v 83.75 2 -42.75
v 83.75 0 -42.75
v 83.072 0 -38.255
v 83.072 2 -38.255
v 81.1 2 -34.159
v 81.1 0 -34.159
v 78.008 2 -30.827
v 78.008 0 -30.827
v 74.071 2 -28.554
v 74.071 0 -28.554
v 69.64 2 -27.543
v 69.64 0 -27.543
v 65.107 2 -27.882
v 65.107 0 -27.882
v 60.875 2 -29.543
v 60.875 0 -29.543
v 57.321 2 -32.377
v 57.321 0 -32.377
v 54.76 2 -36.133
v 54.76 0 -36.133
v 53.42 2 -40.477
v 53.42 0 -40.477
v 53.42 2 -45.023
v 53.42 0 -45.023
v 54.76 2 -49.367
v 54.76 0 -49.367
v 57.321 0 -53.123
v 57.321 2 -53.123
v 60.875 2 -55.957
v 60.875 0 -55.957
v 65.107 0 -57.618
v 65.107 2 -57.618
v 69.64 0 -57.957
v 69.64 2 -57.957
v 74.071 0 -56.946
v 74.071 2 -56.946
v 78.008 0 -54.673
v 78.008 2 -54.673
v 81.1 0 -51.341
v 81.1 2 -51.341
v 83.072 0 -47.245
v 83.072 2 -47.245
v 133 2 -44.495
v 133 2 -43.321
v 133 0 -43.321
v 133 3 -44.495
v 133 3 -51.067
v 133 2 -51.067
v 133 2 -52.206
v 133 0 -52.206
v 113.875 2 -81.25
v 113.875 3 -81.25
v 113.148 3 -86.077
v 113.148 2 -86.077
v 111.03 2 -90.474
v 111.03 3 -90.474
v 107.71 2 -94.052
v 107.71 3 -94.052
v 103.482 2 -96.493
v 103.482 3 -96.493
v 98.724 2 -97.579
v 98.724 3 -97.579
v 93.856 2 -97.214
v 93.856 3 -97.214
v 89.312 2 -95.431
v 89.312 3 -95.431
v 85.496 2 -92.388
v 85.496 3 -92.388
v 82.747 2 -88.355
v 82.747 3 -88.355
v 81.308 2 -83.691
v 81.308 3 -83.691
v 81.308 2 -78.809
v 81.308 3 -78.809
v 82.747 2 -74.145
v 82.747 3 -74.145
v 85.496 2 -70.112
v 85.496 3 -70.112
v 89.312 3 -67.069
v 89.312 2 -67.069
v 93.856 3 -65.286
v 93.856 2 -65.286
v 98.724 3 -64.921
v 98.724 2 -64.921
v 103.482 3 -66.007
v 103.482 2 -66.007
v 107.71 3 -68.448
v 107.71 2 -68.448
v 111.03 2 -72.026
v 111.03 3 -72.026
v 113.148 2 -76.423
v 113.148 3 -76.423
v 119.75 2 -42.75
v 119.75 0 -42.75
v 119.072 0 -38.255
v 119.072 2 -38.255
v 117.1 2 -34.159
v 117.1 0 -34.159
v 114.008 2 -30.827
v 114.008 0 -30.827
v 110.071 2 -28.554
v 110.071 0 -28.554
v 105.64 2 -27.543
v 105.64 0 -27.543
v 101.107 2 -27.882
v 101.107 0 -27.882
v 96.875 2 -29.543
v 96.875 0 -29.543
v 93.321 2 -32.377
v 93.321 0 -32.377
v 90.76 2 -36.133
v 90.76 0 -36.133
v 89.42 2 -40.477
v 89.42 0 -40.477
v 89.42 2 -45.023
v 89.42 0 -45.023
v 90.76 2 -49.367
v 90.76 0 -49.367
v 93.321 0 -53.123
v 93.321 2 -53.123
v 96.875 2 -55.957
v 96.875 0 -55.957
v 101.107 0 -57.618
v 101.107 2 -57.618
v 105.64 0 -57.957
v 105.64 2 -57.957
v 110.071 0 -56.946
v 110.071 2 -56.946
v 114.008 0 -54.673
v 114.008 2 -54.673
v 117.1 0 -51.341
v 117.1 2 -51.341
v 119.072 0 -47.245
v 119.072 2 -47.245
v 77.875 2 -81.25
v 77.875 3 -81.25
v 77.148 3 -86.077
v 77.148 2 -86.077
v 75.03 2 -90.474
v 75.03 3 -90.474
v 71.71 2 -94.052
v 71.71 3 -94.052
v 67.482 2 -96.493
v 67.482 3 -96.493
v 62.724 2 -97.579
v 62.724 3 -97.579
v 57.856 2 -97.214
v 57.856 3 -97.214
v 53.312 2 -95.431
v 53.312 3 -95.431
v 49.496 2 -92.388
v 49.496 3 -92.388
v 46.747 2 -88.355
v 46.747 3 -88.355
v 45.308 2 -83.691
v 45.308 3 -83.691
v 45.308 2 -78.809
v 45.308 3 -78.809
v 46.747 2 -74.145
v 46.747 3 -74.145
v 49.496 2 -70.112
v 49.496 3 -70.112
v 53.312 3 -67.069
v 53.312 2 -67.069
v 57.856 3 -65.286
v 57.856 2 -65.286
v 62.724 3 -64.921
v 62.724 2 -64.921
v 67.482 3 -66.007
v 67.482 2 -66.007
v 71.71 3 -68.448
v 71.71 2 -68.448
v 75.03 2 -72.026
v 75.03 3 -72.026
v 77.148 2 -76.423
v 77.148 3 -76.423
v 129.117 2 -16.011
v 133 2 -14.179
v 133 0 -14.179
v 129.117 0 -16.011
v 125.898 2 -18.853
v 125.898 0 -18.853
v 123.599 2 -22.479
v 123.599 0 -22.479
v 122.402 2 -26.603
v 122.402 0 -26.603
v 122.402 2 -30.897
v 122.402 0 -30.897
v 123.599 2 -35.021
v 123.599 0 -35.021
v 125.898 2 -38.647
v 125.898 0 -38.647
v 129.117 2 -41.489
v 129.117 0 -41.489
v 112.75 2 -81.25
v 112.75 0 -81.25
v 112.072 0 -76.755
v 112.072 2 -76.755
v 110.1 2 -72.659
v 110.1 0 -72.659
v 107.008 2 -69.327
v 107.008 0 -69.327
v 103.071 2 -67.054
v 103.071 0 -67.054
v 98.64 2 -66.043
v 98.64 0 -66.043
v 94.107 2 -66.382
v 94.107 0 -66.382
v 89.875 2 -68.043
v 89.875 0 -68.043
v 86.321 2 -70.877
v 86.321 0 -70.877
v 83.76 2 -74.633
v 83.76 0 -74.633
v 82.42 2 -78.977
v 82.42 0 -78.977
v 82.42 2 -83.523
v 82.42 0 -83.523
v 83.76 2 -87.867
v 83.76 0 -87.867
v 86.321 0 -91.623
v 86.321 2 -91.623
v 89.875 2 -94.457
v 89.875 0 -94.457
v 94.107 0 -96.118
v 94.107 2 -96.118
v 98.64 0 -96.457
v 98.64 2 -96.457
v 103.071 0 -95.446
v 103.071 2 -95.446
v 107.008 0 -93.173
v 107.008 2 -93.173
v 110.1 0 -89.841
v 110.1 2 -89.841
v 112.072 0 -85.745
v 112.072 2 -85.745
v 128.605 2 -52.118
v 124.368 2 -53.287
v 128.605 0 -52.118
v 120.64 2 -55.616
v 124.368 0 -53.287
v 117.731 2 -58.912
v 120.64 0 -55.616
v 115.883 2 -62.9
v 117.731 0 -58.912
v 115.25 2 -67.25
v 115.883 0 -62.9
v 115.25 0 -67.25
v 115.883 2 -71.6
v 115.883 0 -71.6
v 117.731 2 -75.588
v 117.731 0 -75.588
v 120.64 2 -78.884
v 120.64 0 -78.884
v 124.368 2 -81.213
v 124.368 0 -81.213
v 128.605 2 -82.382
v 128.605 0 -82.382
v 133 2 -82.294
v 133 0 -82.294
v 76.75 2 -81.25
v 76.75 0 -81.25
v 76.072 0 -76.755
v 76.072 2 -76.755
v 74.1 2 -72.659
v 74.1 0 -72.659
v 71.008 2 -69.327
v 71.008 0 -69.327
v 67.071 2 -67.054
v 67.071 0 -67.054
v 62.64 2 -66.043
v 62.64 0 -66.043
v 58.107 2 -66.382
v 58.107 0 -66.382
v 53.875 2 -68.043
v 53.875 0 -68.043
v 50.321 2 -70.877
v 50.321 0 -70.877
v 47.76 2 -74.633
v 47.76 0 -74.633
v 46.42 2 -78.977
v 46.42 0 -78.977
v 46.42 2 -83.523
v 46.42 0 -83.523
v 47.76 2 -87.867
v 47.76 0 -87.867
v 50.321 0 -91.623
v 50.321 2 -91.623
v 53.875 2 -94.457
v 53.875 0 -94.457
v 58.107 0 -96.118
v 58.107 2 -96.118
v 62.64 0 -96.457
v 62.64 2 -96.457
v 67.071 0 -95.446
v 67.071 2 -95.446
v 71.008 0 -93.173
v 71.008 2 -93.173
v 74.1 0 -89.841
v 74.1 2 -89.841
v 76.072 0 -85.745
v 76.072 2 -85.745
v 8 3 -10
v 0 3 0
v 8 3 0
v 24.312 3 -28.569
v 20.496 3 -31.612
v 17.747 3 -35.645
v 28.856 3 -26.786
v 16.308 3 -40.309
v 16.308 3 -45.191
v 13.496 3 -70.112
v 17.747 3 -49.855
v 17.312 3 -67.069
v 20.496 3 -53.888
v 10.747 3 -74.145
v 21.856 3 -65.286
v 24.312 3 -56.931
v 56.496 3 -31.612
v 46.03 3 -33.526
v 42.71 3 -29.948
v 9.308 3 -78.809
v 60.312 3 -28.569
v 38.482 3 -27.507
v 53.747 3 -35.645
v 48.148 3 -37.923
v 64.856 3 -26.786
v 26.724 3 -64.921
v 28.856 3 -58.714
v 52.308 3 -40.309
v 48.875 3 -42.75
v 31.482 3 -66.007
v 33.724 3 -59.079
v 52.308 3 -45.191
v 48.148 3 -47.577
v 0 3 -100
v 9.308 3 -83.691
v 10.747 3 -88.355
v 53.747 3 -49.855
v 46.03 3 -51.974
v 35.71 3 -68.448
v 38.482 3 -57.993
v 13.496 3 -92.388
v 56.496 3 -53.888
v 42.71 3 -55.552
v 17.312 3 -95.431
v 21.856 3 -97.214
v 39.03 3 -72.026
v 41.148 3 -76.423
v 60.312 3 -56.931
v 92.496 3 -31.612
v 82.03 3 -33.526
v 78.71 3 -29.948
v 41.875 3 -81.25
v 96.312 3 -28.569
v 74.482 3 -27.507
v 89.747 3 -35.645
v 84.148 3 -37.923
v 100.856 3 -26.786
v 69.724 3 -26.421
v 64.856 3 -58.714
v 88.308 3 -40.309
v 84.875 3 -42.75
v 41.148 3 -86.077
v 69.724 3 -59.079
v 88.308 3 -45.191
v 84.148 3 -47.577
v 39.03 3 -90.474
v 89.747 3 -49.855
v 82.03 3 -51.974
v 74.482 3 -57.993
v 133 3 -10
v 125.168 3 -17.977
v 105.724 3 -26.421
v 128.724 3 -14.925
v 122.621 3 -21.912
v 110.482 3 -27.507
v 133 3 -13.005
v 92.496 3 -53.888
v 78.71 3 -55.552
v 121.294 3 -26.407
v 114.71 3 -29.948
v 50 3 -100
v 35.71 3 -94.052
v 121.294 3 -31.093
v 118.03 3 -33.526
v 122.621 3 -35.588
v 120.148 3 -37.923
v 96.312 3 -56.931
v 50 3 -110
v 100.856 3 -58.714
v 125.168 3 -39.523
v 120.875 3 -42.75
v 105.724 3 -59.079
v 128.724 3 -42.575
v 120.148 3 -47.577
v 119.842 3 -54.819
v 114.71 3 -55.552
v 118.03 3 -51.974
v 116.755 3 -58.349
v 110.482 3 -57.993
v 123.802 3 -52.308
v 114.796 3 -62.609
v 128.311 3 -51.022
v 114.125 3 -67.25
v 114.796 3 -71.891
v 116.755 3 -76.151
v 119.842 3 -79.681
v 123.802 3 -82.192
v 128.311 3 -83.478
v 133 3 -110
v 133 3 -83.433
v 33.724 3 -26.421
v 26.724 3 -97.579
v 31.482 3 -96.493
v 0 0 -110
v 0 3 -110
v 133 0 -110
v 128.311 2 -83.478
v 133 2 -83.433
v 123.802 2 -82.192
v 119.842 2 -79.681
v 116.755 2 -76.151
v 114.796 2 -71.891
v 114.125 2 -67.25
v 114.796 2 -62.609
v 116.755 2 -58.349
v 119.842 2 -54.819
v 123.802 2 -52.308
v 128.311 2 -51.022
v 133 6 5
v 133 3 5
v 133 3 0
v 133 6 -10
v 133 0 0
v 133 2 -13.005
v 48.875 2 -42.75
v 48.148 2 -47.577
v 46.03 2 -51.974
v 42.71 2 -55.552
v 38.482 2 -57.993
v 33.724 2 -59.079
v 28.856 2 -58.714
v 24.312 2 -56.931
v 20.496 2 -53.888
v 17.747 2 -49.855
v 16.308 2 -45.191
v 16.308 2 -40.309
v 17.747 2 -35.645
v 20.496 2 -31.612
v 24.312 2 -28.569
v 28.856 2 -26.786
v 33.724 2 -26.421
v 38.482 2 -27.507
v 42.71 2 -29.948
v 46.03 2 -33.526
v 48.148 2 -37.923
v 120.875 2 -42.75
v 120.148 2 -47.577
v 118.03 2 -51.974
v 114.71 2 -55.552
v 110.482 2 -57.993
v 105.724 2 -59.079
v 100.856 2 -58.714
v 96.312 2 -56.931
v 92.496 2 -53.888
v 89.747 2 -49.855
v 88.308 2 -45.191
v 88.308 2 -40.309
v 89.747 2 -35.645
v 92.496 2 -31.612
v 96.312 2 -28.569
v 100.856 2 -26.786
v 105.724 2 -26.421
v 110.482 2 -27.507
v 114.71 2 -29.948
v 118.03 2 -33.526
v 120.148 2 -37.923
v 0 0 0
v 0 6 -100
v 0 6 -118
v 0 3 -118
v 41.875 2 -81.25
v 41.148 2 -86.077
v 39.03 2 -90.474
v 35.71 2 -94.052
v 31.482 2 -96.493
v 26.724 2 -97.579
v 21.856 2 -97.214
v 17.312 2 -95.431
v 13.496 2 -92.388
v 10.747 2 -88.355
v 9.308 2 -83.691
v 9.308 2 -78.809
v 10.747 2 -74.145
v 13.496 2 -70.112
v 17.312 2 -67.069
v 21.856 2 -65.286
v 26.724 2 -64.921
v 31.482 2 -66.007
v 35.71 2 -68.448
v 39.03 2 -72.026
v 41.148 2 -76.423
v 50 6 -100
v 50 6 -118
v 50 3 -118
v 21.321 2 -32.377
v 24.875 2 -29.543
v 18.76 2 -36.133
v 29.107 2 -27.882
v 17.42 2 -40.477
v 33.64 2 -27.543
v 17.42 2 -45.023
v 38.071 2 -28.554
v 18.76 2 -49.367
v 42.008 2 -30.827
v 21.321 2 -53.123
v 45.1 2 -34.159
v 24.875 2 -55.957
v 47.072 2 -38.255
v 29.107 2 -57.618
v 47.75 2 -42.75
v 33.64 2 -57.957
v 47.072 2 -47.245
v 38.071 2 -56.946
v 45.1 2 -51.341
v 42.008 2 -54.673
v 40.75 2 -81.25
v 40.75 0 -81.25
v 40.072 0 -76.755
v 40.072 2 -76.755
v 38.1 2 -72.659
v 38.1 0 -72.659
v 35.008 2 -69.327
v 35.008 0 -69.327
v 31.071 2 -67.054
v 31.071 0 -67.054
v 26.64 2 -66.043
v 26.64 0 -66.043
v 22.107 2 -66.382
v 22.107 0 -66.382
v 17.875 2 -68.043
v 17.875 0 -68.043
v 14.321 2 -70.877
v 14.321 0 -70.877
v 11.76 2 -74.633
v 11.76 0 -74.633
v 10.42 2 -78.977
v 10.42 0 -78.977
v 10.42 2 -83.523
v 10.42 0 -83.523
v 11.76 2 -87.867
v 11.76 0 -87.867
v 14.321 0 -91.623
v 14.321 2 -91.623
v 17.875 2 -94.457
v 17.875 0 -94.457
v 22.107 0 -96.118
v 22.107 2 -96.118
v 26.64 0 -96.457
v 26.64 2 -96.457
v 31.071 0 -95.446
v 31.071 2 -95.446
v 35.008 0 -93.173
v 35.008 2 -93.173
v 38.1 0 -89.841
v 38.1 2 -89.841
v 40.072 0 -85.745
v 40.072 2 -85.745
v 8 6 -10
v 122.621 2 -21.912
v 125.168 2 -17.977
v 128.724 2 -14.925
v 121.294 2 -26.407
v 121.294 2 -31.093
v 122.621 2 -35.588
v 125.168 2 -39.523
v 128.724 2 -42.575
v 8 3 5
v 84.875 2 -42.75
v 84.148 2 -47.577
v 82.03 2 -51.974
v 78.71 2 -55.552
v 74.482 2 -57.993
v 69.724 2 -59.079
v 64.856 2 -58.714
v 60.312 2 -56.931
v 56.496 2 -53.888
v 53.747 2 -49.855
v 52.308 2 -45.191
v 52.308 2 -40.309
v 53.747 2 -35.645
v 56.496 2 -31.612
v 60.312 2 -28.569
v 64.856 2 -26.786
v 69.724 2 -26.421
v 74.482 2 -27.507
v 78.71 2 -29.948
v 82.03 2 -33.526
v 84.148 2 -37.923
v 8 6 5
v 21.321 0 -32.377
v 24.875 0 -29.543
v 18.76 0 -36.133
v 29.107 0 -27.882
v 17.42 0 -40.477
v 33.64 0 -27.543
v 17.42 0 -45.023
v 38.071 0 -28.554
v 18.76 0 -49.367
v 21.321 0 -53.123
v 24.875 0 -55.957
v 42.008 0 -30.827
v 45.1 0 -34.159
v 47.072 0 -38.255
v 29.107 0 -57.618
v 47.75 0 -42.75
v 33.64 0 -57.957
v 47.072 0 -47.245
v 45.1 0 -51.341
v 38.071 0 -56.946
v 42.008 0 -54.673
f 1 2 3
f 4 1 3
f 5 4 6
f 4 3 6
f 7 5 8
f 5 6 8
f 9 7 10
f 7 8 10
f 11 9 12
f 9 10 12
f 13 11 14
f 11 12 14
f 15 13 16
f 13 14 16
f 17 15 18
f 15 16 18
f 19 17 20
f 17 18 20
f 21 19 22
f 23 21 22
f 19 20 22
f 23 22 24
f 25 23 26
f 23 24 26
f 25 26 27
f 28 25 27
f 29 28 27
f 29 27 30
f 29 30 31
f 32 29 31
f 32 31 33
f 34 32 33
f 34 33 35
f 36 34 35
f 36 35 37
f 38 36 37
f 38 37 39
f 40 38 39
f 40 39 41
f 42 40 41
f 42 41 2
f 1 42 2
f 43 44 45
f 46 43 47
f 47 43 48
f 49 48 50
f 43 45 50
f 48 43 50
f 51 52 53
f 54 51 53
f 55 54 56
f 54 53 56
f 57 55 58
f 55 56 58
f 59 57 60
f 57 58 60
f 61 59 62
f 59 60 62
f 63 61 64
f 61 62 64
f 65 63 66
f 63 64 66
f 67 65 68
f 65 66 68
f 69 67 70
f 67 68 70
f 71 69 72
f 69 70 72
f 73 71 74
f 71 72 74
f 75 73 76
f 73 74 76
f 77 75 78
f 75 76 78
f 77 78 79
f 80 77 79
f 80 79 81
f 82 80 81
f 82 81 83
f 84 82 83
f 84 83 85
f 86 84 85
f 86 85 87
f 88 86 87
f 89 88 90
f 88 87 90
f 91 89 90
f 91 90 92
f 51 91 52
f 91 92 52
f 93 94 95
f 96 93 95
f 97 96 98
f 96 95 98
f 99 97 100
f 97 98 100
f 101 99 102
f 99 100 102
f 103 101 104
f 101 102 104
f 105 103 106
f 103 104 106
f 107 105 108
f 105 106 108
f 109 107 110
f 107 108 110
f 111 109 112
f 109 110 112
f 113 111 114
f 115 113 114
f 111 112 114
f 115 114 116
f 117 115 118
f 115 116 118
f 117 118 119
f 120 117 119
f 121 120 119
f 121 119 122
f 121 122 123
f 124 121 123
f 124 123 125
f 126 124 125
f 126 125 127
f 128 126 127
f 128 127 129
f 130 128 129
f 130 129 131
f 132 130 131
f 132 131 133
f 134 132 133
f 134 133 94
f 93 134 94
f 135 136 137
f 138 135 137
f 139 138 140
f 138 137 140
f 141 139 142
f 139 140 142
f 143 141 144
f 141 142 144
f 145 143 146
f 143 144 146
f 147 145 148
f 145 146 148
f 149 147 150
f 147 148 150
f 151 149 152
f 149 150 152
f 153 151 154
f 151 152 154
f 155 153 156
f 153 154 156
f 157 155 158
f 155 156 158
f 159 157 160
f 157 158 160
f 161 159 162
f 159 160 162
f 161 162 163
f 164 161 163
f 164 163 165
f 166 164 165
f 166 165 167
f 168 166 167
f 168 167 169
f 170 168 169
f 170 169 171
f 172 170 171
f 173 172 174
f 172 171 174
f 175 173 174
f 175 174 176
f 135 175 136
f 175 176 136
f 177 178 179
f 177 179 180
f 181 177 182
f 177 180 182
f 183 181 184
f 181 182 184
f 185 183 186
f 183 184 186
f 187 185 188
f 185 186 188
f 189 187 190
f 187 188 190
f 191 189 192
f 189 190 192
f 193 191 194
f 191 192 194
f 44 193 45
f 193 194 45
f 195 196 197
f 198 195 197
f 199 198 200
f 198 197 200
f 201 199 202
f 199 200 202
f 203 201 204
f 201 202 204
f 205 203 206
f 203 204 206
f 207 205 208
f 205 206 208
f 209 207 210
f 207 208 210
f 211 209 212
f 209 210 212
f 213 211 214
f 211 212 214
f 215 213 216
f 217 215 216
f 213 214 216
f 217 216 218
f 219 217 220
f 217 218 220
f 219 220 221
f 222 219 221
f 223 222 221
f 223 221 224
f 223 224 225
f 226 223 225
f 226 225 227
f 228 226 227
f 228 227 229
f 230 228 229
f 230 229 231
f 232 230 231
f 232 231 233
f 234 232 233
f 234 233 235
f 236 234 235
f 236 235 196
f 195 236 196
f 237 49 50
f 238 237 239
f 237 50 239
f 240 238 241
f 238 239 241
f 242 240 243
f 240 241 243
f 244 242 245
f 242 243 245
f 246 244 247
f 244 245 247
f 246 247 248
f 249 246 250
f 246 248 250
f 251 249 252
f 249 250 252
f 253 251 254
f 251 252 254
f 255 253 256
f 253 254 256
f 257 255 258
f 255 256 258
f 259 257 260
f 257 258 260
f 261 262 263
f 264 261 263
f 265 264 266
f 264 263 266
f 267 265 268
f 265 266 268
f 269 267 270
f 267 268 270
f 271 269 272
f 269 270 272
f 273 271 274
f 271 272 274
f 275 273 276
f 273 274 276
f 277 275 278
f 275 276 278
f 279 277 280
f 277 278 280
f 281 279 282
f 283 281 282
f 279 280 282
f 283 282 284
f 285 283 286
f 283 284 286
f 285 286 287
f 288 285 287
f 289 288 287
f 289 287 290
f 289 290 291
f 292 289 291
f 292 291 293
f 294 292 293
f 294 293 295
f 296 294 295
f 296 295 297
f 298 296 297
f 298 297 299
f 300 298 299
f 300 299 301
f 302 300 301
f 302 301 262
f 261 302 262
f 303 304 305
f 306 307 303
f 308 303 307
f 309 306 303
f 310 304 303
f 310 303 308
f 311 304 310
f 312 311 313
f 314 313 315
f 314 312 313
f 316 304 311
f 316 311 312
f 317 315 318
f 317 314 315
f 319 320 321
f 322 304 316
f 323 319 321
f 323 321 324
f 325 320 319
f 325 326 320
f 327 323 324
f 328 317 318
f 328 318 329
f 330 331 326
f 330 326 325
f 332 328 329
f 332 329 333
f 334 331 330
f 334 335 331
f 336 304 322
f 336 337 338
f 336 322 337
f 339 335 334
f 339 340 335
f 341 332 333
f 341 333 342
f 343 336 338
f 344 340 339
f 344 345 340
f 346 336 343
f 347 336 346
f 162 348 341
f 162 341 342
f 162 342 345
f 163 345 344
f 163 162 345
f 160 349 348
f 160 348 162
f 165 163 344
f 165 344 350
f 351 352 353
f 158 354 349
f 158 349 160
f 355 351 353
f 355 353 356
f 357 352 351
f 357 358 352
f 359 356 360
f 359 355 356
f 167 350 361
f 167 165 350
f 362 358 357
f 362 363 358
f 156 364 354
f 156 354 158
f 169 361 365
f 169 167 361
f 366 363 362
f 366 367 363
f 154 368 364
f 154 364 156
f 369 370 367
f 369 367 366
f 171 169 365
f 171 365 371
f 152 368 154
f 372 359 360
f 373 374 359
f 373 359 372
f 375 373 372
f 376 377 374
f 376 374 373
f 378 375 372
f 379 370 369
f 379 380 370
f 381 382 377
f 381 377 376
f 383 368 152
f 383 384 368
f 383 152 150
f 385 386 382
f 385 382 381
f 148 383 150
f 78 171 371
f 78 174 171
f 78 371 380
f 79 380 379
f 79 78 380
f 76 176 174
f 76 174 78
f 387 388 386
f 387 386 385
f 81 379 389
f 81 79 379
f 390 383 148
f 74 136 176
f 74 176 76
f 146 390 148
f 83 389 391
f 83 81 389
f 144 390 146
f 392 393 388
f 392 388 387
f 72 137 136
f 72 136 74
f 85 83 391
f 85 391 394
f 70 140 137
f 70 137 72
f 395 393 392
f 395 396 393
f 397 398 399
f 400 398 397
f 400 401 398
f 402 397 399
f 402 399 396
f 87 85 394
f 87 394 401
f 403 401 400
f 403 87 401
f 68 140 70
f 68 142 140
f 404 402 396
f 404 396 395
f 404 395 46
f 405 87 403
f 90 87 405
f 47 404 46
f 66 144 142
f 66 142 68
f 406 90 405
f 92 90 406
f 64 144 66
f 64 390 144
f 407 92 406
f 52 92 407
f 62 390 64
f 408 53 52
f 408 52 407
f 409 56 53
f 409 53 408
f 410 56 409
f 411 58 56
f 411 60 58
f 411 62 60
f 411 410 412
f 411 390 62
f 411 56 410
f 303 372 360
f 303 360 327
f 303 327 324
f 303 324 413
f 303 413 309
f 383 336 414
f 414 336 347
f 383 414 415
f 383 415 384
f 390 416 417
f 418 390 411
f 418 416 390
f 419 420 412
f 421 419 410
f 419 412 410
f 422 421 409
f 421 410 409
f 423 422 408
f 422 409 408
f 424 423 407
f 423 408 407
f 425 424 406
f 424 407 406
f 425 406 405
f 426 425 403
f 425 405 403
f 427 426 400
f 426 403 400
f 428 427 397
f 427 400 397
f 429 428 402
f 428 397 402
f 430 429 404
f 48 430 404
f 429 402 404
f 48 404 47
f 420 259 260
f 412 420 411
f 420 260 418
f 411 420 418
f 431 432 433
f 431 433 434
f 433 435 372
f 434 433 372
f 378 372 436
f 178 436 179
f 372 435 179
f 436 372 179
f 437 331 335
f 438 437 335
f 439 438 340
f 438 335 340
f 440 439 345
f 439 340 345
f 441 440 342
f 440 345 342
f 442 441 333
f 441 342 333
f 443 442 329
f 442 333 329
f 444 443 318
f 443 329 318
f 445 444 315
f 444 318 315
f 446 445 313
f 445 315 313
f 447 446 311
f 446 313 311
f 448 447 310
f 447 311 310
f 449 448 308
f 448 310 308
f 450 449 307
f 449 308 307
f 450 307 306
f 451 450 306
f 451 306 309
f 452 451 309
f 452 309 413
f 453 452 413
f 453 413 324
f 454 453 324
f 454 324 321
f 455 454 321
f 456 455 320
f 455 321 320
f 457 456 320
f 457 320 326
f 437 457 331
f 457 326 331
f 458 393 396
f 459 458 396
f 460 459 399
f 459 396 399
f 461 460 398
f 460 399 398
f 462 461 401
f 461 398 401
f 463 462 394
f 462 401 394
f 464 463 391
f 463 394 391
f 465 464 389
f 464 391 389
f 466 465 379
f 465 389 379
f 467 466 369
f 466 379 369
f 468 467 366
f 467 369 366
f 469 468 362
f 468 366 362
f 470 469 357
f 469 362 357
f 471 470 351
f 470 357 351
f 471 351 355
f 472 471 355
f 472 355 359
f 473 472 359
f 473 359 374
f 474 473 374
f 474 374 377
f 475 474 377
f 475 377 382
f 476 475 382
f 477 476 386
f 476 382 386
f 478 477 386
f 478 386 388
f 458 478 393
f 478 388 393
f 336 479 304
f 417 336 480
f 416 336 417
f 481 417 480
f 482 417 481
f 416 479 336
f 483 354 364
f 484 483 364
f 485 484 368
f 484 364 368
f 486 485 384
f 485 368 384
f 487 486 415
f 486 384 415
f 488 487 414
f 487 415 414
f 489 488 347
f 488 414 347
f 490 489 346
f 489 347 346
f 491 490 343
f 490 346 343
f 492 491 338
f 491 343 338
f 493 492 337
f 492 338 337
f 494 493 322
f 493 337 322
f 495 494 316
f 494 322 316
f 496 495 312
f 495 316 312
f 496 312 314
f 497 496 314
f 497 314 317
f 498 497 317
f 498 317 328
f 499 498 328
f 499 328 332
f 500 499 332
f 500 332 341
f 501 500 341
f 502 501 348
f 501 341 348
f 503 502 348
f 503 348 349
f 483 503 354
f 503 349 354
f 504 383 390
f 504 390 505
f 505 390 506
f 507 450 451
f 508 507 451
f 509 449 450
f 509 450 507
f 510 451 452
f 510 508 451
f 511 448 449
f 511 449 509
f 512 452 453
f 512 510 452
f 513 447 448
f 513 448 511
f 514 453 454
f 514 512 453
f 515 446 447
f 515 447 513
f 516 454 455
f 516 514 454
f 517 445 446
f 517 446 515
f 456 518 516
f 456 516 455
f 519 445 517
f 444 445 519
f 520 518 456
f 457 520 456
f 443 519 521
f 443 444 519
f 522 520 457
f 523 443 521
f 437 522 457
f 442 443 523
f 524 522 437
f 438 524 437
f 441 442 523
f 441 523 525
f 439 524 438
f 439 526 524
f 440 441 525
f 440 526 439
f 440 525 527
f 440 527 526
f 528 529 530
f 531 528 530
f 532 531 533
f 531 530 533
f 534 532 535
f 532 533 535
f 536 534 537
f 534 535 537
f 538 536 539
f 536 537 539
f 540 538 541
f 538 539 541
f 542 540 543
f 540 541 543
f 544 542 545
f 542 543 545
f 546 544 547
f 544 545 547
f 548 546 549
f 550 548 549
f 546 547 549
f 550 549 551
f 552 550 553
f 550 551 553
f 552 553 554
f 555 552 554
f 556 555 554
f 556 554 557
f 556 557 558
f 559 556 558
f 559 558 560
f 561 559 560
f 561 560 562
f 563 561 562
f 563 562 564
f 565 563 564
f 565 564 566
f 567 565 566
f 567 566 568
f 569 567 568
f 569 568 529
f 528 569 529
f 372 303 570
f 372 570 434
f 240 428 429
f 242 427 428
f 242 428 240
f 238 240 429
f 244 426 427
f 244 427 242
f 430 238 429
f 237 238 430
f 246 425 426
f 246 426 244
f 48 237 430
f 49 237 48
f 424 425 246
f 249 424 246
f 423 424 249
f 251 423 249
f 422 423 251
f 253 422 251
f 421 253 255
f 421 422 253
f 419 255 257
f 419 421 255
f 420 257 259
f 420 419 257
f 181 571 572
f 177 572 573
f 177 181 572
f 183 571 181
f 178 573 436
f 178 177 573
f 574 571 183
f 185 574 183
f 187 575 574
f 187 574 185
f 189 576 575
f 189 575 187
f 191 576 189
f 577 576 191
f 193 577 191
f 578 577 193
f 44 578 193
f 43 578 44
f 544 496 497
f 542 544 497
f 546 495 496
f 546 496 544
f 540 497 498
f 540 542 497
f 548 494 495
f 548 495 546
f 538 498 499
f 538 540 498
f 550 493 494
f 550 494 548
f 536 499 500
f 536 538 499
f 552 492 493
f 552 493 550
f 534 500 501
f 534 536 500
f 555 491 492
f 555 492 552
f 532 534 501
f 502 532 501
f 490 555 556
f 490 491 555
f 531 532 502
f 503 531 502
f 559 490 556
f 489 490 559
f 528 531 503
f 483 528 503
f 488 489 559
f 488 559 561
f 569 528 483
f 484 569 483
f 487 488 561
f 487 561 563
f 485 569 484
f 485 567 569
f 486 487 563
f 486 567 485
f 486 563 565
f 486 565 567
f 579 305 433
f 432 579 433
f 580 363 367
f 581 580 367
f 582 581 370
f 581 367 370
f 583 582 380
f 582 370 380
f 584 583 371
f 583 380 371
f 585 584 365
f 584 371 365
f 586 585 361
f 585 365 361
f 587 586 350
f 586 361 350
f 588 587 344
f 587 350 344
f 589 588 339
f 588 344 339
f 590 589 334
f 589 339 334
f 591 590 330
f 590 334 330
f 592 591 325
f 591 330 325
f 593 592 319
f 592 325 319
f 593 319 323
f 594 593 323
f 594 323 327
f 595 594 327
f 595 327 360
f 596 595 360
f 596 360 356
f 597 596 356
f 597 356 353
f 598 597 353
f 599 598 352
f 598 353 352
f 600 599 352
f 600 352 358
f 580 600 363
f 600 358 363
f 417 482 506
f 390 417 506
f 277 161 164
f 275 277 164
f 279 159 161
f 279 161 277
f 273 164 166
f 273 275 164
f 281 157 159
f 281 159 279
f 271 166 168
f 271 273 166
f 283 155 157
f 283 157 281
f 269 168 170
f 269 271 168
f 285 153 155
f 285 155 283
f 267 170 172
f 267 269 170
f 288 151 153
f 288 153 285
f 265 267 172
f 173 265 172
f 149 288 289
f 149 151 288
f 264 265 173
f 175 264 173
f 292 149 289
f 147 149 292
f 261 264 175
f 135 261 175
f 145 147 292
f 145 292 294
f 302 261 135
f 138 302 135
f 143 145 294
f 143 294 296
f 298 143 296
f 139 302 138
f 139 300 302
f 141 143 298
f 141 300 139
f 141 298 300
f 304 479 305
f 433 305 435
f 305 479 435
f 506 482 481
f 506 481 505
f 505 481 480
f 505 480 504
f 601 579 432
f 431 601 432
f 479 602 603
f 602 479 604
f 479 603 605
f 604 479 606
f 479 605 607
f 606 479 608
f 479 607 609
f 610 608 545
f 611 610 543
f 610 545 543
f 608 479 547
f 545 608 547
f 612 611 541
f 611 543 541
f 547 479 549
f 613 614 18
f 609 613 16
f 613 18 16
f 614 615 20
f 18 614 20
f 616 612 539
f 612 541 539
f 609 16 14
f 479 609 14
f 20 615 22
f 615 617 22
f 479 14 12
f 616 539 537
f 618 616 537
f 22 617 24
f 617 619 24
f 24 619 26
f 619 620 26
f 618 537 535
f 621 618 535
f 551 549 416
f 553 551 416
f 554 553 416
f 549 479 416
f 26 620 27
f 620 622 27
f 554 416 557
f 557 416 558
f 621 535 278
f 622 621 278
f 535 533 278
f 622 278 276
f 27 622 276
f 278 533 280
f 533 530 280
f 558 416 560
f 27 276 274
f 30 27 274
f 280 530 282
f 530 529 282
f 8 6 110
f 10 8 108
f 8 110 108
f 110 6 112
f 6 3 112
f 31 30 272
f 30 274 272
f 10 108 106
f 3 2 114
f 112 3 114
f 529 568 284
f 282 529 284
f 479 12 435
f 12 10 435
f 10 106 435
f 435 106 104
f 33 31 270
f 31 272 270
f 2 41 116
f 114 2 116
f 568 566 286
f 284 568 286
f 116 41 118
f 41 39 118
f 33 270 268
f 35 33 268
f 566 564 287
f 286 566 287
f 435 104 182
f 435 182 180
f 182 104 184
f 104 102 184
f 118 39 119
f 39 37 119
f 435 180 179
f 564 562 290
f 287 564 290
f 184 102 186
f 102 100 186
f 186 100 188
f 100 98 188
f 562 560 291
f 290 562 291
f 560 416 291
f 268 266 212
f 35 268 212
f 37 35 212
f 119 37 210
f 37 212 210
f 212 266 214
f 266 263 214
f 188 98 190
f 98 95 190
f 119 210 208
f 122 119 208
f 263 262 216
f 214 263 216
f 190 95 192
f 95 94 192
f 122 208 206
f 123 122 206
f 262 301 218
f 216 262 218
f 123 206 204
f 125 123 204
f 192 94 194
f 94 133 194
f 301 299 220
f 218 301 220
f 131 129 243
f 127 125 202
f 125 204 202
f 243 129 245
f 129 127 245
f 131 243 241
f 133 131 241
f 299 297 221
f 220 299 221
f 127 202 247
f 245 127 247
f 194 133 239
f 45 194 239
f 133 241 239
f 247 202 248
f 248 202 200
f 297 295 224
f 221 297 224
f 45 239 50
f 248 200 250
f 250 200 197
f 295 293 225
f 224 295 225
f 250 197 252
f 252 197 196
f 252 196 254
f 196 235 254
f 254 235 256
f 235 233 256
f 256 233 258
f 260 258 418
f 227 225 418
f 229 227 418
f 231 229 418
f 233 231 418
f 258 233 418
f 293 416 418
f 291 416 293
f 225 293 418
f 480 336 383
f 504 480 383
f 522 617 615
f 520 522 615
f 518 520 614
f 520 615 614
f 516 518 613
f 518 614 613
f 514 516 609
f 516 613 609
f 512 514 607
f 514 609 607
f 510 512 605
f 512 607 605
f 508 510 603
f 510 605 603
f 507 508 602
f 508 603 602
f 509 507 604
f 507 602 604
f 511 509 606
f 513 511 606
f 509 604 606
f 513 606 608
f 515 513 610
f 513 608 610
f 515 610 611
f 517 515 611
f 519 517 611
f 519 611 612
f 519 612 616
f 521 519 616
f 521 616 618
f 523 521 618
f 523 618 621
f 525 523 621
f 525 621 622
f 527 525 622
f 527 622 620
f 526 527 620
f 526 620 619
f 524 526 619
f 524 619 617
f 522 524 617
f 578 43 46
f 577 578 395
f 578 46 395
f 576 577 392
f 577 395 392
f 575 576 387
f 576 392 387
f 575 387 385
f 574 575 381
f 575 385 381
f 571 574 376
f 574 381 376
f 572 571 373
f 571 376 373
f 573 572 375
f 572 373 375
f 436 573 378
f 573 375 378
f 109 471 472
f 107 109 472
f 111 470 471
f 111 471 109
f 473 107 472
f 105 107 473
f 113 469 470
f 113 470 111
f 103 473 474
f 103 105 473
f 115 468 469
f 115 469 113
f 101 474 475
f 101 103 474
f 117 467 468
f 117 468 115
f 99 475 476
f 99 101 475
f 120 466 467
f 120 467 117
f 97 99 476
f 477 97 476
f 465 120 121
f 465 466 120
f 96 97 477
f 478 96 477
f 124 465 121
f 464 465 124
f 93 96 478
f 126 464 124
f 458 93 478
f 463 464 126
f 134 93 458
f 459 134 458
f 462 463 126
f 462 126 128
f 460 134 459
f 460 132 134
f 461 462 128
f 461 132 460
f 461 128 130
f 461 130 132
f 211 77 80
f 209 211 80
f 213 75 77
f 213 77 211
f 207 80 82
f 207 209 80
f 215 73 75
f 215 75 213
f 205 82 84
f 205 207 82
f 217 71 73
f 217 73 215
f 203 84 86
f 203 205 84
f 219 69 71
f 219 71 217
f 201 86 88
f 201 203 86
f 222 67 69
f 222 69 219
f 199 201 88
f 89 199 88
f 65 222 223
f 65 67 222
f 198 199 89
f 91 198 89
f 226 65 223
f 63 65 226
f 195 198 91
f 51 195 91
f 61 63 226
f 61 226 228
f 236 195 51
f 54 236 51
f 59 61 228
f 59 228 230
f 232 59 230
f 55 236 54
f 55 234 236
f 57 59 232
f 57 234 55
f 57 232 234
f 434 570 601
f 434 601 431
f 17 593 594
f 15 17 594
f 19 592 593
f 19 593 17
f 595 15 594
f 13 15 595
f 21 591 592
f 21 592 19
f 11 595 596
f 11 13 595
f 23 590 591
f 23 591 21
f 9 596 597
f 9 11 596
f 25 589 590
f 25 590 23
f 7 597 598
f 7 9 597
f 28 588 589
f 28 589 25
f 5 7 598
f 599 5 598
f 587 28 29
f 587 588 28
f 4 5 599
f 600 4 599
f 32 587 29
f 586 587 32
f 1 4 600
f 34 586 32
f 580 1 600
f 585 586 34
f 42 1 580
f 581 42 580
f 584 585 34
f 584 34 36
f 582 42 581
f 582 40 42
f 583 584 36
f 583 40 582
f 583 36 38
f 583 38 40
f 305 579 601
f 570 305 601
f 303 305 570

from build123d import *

# Parameters (mm, degrees)
SKETCH1_W           = 133
SKETCH1_H           = 110
BOSS_EXTRUDE1_DEPTH = 3
SKETCH2_W           = 50
SKETCH2_H           = 18
BOSS_EXTRUDE2_DEPTH = 3
SKETCH3_W           = 125
SKETCH3_H           = 15
BOSS_EXTRUDE3_DEPTH = 3
SKETCH4_R           = 15.25
CUT_EXTRUDE1_DEPTH  = 3
SKETCH5_R           = 16.375
CUT_EXTRUDE2_DEPTH  = 1


with BuildPart() as part:
    # Sketch1 → Boss-Extrude1 (new body)
    with BuildSketch(Plane(origin=(0, 0, 0), x_dir=(1, 0, 0), z_dir=(0, 1, 0))):
        with Locations((66.5, 55)):
            Rectangle(SKETCH1_W, SKETCH1_H)
    extrude(amount=BOSS_EXTRUDE1_DEPTH)

    # Sketch2 → Boss-Extrude2 (add)
    with BuildSketch(Plane(origin=(0, 3, 0), x_dir=(1, 0, 0), z_dir=(0, 1, 0))):
        with Locations((25, 109)):
            Rectangle(SKETCH2_W, SKETCH2_H)
    extrude(amount=BOSS_EXTRUDE2_DEPTH)

    # Sketch3 → Boss-Extrude3 (add)
    with BuildSketch(Plane(origin=(0, 3, 0), x_dir=(1, 0, 0), z_dir=(0, 1, 0))):
        with Locations((70.5, 2.5)):
            Rectangle(SKETCH3_W, SKETCH3_H)
    extrude(amount=BOSS_EXTRUDE3_DEPTH)

    # Sketch4 → Cut-Extrude1 (cut)
    with BuildSketch(Plane.XZ):
        with Locations((25.5, -81.25)):
            Circle(SKETCH4_R)
        with Locations((32.5, -42.75)):
            Circle(SKETCH4_R)
        with Locations((61.5, -81.25)):
            Circle(SKETCH4_R)
        with Locations((97.5, -81.25)):
            Circle(SKETCH4_R)
        with Locations((130.5, -67.25)):
            Circle(SKETCH4_R)
        with Locations((68.5, -42.75)):
            Circle(SKETCH4_R)
        with Locations((104.5, -42.75)):
            Circle(SKETCH4_R)
        with Locations((137.5, -28.75)):
            Circle(SKETCH4_R)
    extrude(amount=-CUT_EXTRUDE1_DEPTH, mode=Mode.SUBTRACT)

    # Sketch5 → Cut-Extrude2 (cut)
    with BuildSketch(Plane(origin=(0, 3, 0), x_dir=(1, 0, 0), z_dir=(0, 1, 0))):
        with Locations((25.5, 81.25)):
            Circle(SKETCH5_R)
        with Locations((61.5, 81.25)):
            Circle(SKETCH5_R)
        with Locations((97.5, 81.25)):
            Circle(SKETCH5_R)
        with Locations((32.5, 42.75)):
            Circle(SKETCH5_R)
        with Locations((68.5, 42.75)):
            Circle(SKETCH5_R)
        with Locations((104.5, 42.75)):
            Circle(SKETCH5_R)
        with Locations((130.5, 67.25)):
            Circle(SKETCH5_R)
        with Locations((137.5, 28.75)):
            Circle(SKETCH5_R)
    extrude(amount=-CUT_EXTRUDE2_DEPTH, mode=Mode.SUBTRACT)


solid = part.part
